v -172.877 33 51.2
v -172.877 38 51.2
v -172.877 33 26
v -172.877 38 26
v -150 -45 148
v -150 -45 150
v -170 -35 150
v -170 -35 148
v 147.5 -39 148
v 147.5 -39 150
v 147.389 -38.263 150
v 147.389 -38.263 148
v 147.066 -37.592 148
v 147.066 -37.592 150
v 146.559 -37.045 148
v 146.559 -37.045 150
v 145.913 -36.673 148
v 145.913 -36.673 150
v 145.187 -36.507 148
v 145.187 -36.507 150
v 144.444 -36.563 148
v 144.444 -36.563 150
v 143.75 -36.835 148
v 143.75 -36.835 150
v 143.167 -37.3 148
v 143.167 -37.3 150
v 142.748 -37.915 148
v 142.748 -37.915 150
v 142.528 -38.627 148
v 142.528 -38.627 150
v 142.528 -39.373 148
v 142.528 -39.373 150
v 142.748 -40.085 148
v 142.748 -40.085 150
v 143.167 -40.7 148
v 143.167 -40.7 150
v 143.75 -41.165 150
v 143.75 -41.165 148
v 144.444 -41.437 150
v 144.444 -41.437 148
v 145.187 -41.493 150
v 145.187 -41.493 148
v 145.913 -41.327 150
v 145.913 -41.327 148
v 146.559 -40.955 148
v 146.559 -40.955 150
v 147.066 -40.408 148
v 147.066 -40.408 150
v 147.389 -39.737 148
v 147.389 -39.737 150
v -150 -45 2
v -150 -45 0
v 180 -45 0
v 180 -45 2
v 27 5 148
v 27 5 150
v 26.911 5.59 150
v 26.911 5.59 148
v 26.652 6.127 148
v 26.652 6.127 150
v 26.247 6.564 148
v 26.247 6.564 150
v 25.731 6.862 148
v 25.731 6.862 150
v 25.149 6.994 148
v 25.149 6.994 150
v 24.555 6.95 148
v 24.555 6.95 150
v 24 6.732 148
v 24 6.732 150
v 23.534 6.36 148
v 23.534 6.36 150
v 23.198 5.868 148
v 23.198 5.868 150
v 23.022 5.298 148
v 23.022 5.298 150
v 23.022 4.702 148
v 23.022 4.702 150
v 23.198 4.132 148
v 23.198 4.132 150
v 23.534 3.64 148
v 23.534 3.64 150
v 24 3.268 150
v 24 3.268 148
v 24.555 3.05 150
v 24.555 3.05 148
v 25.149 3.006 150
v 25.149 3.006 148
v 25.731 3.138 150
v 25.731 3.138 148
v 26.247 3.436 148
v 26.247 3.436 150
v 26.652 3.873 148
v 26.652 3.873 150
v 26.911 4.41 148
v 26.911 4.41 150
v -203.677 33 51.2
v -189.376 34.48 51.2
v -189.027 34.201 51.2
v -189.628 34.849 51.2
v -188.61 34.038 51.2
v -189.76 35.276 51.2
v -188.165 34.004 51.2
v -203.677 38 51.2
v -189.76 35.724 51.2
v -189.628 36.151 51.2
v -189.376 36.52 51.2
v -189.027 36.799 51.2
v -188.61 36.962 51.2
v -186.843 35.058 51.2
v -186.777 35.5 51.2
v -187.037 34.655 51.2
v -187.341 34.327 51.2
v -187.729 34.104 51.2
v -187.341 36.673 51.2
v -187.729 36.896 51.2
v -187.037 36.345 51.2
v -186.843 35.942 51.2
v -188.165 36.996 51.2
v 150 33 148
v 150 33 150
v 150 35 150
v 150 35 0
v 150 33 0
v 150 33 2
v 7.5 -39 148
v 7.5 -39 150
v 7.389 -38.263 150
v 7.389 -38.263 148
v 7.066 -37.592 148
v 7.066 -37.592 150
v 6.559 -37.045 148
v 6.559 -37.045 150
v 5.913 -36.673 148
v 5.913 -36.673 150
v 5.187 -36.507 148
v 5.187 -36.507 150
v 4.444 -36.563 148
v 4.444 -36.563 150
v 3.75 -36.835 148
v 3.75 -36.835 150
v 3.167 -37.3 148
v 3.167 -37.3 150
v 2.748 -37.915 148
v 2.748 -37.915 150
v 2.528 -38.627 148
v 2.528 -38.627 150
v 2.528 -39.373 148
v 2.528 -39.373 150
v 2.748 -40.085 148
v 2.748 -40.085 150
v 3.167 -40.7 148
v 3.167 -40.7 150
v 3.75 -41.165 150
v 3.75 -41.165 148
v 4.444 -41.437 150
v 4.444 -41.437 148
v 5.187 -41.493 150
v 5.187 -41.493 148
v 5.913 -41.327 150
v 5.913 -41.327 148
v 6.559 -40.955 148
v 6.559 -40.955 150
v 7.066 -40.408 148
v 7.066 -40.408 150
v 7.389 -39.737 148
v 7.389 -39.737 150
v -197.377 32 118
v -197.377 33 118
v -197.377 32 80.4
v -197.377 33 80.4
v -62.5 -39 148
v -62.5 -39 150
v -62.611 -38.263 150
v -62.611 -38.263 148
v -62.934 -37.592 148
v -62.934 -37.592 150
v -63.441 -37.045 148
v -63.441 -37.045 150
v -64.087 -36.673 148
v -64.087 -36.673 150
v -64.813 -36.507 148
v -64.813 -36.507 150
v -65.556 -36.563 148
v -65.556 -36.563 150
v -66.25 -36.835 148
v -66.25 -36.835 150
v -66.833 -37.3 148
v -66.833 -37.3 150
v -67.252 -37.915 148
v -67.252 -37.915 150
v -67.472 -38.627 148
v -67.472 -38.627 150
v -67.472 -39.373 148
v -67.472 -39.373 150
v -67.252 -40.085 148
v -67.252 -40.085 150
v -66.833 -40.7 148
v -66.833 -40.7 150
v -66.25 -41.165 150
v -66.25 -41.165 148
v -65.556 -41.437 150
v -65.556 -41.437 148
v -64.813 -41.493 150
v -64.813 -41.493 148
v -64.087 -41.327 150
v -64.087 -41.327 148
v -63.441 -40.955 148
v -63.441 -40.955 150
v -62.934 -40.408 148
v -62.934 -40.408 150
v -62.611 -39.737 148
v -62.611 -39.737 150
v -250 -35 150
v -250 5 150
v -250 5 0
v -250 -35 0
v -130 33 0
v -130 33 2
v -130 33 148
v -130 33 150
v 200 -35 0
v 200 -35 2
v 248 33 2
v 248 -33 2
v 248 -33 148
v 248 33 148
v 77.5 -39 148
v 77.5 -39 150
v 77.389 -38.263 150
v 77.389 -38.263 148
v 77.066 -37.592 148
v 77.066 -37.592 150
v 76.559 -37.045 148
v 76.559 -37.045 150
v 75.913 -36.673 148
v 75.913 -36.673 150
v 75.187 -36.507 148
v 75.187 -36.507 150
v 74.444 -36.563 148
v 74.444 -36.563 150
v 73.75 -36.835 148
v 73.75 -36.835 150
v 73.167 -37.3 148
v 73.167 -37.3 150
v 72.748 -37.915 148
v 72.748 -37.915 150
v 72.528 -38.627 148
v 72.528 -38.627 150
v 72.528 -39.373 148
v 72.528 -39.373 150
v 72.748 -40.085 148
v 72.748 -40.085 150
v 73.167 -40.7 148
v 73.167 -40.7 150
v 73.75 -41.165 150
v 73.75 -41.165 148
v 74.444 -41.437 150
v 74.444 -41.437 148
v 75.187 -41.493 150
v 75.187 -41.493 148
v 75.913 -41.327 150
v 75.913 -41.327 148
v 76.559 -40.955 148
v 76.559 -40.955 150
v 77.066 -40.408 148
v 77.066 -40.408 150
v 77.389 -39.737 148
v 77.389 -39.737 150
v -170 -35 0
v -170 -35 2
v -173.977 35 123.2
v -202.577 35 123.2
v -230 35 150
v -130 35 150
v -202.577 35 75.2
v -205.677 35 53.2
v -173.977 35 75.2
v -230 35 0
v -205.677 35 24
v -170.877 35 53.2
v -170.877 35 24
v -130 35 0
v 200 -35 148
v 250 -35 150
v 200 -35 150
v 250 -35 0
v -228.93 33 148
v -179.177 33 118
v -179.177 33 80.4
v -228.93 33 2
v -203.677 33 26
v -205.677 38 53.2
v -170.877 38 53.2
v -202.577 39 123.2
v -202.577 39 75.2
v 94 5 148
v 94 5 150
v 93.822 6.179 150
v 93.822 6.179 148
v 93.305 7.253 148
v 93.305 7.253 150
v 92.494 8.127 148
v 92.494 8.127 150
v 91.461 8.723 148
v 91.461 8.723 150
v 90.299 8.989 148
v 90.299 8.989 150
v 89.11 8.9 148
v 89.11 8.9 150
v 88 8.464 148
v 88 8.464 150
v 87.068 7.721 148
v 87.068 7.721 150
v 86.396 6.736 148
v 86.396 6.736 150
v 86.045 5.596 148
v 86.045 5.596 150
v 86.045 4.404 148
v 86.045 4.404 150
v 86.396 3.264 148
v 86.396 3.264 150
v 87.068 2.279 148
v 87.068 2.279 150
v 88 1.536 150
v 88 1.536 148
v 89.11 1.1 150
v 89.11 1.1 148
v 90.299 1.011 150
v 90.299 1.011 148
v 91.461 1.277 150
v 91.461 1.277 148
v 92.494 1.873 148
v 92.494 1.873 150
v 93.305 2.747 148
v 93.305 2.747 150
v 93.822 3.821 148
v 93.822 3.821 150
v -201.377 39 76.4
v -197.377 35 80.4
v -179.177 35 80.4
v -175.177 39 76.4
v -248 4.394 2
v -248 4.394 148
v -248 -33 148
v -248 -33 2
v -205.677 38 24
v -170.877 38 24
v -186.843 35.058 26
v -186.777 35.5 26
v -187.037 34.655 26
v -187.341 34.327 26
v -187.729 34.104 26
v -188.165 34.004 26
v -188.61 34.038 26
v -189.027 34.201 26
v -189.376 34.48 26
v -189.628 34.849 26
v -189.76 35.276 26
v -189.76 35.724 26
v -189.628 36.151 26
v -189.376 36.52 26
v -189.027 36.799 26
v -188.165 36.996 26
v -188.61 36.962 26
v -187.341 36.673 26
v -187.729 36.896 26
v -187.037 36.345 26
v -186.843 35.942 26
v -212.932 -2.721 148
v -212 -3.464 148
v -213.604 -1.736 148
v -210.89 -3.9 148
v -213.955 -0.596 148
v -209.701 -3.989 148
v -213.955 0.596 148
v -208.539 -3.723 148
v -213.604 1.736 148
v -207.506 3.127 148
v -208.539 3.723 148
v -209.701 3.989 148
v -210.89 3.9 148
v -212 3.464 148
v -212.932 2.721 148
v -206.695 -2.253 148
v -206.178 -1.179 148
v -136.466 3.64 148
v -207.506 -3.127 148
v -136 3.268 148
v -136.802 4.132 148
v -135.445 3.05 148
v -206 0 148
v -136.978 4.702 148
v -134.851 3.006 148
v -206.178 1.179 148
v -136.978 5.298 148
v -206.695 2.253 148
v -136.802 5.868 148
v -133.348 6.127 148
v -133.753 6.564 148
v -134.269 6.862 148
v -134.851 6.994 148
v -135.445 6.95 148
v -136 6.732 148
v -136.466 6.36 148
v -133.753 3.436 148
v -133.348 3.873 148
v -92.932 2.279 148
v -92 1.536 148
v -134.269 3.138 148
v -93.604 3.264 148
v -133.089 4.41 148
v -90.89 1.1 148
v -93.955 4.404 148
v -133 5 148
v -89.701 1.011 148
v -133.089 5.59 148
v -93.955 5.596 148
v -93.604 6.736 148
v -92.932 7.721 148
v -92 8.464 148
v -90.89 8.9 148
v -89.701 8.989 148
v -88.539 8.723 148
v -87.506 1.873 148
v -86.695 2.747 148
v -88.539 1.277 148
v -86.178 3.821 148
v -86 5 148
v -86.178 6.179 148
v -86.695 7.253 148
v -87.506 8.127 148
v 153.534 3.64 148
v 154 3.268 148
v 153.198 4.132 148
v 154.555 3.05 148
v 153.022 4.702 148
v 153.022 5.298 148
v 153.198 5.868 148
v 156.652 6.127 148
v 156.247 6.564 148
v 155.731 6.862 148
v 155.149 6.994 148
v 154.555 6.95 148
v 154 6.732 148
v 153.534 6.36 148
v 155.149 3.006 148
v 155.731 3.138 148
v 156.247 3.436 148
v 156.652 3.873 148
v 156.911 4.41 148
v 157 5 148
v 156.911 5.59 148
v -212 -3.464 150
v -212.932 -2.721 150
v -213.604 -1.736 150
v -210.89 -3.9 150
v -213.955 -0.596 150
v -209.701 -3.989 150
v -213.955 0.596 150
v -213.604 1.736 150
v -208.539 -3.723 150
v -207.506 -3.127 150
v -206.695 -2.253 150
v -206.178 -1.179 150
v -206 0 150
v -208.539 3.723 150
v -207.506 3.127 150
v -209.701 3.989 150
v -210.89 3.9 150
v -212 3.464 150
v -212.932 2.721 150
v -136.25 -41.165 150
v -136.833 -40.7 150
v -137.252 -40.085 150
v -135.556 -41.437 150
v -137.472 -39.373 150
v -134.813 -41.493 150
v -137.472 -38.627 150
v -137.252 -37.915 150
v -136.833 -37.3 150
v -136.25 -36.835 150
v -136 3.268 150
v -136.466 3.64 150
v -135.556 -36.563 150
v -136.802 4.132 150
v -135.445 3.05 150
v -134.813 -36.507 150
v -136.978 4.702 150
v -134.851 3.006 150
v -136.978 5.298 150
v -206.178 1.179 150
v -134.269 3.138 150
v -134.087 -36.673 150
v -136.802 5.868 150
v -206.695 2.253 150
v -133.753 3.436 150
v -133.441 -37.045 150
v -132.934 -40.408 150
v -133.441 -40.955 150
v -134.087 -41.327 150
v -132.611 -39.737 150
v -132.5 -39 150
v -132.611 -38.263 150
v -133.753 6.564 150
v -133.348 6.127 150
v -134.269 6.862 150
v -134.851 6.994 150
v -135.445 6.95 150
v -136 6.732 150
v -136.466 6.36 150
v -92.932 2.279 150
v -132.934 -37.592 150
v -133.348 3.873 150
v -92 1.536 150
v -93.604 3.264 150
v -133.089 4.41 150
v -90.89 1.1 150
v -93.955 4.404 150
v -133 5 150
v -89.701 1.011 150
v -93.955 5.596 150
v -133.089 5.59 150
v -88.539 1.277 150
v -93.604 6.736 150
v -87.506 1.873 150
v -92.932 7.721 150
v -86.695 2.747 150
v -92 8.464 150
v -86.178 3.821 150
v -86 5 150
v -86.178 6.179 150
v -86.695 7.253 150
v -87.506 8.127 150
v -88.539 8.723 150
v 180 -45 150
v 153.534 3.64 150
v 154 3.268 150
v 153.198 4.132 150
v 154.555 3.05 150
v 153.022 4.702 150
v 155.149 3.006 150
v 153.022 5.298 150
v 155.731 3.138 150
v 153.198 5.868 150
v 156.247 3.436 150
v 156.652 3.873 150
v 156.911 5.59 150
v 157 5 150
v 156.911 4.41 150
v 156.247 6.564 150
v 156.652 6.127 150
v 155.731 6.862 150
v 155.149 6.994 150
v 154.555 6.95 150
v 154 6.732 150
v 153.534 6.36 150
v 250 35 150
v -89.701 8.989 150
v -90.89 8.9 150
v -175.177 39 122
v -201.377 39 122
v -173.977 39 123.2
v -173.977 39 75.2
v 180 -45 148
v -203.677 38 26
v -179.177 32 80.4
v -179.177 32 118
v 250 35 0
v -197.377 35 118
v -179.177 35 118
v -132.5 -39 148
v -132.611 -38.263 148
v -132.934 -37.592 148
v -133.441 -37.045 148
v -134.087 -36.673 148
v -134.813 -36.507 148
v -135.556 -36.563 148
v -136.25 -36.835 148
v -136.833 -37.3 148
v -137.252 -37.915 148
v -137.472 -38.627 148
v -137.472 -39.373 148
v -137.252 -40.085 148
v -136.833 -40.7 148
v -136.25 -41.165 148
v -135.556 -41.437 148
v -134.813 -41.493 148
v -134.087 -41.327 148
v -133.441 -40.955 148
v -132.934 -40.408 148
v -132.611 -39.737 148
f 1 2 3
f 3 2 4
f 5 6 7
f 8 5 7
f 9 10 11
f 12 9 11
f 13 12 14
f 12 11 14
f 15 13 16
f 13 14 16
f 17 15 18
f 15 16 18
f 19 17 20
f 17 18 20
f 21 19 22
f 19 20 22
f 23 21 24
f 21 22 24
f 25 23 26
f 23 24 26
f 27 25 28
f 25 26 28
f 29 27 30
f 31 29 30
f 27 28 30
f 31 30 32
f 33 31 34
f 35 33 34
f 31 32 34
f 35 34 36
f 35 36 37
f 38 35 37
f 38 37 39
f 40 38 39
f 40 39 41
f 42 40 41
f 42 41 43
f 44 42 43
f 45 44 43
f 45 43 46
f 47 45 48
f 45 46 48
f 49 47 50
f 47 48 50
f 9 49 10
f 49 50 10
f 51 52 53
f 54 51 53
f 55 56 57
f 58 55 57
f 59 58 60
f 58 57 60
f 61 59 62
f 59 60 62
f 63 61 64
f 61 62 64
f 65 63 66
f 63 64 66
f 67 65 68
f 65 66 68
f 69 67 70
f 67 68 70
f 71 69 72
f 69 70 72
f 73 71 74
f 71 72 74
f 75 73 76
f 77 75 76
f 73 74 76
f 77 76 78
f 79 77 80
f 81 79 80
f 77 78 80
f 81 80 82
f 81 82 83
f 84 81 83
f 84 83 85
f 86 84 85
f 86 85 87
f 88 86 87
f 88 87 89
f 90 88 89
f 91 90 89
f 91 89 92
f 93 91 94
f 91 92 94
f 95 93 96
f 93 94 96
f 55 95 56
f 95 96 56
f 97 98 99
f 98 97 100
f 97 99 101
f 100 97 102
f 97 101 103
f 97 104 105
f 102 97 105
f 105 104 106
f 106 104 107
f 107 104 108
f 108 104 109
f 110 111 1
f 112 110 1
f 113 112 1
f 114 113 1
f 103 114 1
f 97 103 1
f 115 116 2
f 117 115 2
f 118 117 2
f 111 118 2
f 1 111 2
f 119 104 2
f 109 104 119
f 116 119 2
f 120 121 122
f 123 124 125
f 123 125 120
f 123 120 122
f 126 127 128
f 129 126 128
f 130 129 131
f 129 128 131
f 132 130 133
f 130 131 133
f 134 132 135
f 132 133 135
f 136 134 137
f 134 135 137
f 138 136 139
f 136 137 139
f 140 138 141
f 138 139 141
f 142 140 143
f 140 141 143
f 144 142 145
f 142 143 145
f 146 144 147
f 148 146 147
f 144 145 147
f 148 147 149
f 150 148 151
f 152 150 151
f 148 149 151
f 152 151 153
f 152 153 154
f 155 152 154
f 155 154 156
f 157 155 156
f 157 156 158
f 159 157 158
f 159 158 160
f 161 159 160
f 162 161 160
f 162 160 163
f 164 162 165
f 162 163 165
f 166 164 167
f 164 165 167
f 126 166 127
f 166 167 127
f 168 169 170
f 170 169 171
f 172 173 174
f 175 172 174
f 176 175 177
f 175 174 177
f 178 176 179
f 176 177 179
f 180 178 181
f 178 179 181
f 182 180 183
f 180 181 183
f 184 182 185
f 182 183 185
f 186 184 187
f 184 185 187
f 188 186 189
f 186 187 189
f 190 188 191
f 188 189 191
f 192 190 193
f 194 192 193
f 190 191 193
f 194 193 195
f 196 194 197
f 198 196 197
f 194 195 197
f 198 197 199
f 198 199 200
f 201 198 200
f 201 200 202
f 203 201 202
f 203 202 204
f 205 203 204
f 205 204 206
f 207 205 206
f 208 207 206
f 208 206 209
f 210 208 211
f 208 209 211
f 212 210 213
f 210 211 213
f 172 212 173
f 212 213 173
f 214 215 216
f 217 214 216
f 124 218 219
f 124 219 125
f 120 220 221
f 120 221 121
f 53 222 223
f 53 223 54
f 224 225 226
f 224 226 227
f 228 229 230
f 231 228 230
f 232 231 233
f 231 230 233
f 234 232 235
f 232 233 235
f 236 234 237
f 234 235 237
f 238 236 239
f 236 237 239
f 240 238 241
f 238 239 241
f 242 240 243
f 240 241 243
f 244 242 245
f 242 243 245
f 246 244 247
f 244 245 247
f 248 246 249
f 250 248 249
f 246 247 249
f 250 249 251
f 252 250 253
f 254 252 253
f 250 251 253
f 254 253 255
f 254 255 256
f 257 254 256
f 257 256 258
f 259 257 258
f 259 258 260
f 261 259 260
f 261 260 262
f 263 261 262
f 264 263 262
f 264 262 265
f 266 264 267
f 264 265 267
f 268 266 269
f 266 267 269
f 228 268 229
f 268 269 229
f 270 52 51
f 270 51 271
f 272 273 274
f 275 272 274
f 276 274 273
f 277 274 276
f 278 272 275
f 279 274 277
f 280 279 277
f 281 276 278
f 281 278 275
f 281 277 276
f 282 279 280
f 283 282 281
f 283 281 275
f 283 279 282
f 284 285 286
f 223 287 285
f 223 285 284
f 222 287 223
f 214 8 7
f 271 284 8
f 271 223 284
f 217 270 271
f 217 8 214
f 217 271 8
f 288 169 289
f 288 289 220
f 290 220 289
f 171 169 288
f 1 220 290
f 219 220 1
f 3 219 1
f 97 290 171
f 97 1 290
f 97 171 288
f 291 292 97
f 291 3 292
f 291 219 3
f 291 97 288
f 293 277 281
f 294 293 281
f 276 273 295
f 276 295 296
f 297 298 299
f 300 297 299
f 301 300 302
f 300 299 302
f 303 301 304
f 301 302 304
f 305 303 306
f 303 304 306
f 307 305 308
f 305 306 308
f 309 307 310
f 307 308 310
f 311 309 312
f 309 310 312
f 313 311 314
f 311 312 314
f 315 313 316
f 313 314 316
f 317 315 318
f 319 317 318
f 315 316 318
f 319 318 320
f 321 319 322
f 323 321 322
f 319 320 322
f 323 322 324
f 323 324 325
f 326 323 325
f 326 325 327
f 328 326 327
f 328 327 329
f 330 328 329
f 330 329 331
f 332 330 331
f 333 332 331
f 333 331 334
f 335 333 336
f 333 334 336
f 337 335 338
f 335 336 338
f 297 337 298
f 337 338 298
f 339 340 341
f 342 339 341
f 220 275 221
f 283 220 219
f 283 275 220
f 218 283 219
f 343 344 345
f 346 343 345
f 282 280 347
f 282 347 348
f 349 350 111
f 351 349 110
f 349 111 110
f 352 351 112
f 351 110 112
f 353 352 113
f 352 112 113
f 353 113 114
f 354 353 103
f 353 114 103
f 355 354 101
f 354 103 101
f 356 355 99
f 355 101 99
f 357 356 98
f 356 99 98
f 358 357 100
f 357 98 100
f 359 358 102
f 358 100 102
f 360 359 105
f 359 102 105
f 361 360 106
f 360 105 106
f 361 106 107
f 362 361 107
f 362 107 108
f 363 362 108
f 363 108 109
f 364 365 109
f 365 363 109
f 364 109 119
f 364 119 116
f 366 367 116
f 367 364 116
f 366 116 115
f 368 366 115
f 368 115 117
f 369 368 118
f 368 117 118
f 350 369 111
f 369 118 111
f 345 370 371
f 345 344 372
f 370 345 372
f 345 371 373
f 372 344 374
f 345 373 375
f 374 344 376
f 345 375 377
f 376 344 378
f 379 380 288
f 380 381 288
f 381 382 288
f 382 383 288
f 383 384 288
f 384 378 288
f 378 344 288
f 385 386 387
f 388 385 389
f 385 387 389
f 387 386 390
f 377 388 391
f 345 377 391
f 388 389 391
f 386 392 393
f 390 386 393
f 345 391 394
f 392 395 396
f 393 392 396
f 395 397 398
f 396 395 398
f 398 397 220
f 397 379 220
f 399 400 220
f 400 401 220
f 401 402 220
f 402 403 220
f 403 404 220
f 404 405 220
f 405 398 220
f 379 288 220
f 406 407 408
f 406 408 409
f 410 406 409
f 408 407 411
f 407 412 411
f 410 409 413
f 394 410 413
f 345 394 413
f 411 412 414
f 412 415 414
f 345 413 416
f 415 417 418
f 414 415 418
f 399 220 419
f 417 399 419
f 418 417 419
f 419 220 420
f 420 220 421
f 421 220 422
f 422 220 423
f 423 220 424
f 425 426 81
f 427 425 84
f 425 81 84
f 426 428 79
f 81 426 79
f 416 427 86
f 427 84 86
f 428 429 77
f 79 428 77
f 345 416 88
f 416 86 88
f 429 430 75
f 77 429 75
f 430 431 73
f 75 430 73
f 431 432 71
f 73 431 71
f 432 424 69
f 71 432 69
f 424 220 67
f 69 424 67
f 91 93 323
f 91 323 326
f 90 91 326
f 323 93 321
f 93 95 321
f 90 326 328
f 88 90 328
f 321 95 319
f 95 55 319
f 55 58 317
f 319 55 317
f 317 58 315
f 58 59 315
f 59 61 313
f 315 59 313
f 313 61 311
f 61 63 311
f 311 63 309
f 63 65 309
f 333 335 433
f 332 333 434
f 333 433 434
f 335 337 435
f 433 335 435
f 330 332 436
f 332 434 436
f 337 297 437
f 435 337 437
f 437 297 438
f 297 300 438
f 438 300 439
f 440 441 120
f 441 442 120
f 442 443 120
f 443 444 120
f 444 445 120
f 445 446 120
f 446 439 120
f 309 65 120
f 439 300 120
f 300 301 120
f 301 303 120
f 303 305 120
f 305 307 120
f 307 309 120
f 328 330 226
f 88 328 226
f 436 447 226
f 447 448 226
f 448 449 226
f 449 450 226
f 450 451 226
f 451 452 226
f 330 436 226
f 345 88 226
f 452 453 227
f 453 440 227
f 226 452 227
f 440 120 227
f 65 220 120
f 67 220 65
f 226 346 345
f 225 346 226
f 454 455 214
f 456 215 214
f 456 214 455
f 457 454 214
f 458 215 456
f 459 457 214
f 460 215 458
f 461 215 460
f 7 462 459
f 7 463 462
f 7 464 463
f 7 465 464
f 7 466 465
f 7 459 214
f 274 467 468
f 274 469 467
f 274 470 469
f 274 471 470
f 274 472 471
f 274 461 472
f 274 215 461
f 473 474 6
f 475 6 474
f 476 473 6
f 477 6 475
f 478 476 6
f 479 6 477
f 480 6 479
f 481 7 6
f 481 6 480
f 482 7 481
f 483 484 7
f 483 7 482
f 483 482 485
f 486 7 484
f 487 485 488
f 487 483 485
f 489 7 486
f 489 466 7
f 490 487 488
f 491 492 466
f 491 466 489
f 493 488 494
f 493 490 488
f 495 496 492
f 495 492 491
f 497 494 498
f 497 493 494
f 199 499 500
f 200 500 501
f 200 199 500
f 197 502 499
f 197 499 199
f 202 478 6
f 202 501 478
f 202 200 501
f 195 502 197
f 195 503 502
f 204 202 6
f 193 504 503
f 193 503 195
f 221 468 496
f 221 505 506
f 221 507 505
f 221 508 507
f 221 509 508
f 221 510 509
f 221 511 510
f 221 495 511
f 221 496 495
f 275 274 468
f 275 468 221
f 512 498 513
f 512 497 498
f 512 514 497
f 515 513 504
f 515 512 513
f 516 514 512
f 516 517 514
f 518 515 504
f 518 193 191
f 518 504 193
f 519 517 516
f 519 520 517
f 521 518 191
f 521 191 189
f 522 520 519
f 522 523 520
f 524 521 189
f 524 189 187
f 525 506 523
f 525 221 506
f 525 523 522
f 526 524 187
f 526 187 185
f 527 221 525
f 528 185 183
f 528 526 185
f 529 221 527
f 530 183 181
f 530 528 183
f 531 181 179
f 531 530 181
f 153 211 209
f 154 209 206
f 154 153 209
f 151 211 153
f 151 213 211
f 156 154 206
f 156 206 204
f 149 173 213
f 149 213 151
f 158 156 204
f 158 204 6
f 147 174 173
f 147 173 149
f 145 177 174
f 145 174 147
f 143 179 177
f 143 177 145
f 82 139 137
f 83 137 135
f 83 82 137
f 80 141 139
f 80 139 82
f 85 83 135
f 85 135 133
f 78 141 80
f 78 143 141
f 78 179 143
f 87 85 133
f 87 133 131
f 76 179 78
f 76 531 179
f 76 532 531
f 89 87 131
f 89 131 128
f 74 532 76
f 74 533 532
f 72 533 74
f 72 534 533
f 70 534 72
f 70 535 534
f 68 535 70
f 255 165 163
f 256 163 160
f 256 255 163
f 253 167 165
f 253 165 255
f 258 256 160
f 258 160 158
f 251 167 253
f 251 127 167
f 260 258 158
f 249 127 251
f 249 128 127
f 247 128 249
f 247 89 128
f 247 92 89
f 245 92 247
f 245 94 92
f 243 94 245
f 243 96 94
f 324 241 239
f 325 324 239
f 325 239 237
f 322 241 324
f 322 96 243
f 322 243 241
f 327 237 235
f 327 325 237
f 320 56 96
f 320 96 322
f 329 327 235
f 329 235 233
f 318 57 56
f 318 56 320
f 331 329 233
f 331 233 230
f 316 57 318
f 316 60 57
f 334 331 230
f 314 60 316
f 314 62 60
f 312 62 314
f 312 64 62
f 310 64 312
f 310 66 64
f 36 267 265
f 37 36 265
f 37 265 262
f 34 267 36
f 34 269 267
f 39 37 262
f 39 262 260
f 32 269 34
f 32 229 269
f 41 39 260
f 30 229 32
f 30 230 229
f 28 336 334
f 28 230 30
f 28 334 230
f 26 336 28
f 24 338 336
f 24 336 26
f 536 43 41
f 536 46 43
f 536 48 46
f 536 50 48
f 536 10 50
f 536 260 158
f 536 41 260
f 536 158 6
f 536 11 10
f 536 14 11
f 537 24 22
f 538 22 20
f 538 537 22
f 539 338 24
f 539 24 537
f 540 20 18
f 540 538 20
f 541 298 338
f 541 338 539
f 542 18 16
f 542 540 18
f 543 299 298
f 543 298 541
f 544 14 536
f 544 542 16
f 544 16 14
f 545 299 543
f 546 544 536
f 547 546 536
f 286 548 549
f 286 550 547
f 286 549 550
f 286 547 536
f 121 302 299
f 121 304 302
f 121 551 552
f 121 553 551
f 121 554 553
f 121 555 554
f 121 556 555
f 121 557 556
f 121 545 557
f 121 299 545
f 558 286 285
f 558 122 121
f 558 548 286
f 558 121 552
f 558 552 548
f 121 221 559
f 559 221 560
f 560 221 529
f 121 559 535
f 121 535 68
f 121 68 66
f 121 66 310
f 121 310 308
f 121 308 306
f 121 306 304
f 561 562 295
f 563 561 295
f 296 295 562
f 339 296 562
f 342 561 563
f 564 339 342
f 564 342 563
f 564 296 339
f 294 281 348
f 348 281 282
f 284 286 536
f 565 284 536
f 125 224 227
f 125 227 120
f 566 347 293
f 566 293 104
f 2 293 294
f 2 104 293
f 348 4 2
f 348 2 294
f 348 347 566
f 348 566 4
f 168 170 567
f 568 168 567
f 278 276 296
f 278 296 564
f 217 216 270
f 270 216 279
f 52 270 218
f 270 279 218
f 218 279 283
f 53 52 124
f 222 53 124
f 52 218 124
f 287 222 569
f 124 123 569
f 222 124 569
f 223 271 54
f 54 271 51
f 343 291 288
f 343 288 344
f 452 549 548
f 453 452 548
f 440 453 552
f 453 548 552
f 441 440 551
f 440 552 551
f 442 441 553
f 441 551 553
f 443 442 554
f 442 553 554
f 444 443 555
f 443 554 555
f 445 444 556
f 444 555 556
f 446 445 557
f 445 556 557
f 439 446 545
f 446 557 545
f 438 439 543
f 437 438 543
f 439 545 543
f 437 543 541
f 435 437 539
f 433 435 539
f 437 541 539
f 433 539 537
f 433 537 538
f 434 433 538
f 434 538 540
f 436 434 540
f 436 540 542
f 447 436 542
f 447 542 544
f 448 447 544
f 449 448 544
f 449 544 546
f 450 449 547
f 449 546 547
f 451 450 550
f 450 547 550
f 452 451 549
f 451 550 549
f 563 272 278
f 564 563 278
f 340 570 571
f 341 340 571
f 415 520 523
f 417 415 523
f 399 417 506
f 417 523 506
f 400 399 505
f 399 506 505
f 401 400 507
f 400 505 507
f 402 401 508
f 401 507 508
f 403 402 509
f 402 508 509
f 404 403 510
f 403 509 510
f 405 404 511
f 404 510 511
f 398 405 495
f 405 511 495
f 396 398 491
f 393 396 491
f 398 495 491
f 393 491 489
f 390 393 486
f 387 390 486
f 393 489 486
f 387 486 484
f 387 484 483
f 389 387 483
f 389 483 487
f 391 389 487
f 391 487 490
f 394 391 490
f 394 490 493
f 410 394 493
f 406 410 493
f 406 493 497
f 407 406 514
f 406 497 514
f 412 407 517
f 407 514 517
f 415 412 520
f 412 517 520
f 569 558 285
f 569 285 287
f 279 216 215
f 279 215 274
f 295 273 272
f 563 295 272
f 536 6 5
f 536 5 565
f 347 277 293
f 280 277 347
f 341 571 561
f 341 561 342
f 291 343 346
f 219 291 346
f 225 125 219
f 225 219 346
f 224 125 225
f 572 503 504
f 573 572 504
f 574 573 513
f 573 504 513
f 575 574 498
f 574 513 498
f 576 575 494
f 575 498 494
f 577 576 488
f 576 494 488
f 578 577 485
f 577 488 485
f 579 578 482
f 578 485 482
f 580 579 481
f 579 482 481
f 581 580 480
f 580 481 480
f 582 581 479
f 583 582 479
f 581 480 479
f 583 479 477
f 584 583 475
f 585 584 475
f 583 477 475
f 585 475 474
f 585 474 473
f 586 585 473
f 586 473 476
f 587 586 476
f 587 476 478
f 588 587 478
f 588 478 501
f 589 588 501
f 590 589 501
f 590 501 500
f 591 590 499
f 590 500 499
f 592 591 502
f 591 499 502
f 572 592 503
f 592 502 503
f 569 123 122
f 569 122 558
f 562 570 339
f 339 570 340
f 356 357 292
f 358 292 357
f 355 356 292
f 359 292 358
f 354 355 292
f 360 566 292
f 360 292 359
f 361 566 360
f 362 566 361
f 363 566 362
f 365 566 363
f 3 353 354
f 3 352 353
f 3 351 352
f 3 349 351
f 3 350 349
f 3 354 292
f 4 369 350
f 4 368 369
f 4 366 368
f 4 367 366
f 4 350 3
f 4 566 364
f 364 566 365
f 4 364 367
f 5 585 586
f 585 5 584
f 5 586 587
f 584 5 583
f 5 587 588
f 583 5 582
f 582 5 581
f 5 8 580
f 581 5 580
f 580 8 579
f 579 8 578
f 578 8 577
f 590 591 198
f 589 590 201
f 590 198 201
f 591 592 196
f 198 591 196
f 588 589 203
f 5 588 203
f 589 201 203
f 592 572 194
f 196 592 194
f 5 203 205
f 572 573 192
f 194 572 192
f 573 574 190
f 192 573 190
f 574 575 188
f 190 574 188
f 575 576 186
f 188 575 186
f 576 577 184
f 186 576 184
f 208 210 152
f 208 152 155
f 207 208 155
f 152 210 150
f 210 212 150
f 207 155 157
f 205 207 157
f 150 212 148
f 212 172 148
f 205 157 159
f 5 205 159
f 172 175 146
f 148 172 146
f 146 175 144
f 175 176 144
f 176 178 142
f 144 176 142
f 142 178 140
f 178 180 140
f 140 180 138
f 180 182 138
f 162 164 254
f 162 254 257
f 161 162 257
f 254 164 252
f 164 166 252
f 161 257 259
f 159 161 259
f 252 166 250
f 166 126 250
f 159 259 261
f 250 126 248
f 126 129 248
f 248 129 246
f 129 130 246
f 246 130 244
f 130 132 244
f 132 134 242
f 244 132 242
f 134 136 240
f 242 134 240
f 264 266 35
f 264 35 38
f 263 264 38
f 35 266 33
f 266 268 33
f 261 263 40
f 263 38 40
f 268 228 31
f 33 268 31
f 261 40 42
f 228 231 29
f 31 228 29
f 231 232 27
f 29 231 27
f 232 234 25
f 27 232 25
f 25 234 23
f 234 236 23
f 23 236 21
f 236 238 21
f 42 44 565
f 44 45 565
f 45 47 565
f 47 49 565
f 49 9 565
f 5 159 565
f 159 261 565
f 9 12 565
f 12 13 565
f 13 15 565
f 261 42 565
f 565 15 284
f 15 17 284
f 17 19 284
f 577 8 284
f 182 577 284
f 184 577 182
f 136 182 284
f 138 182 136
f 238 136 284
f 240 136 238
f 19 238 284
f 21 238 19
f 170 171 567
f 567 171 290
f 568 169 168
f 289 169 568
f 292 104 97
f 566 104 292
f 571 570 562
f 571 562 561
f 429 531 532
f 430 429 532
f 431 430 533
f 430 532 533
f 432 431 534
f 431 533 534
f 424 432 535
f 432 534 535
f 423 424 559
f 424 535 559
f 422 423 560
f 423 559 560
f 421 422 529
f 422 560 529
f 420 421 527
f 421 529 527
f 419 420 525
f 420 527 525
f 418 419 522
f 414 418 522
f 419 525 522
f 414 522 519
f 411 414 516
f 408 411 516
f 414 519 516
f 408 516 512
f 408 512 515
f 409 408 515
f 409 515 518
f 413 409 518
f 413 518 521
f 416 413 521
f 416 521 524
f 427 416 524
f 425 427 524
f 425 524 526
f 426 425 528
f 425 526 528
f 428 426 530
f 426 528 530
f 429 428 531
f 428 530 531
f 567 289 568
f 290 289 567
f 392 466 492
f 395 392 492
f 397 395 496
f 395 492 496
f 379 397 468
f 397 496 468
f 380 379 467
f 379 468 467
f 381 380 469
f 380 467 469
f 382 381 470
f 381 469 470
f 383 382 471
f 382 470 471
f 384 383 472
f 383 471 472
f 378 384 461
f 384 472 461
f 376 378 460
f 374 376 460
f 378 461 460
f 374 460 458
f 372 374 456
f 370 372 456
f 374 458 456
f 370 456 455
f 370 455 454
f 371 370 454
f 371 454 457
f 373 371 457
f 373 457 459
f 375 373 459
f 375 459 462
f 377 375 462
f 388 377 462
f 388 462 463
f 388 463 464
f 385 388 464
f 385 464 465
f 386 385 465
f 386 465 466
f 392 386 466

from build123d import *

# Parameters (mm, degrees)
EXTRUDE_1_DEPTH        = 150
SHELL_START            = 2
SHELL_1_DEPTH          = 146
SKETCH_3_W             = 500
SKETCH_3_H             = 2
EXTRUDE_2_DEPTH        = 10
CUT_EXTRUDE_1_DEPTH    = 10
SKETCH_5_R             = 2.5
CUT_EXTRUDE_2_DEPTH    = 2
PATTERN_LINEAR_1_COUNT = 5
PATTERN_LINEAR_1_PITCH = 70
SKETCH_6_R             = 2
CUT_EXTRUDE_3_DEPTH    = 2
SKETCH_7_R             = 4
CUT_EXTRUDE_4_DEPTH    = 2
CUT_EXTRUDE_5_REACH    = 297
SKETCH_8_R             = 4
SKETCH_9_W             = 28.6
SKETCH_9_H             = 48
SKETCH_9_W_2           = 18.2
SKETCH_9_H_2           = 37.6
EXTRUDE_3_DEPTH        = 4
CHAMFER_1_SIZE         = 4
SKETCH_11_W            = 34.8
SKETCH_11_H            = 29.2
SKETCH_11_W_2          = 30.8
SKETCH_11_H_2          = 25.2
EXTRUDE_4_DEPTH        = 3
CUT_EXTRUDE_6_REACH    = 304.324
SKETCH_11_2_W          = 30.8
SKETCH_11_2_H          = 25.2
EXTRUDE_5_REACH        = 274.555
SKETCH_14_R            = 1.5
SKETCH_9_2_W           = 18.2
SKETCH_9_2_H           = 37.6
EXTRUDE_6_DEPTH        = 3


# Read off the part's stored shape, not the designer's step: 抽壳1
with BuildPart() as part:
    # 草图1 → 凸台-拉伸1 (new body)
    with BuildSketch(Plane.XY):
        Polygon((-250, 5), (-230, 35), (-130, 35), (-130, 33), (150, 33), (150, 35), (250, 35), (250, -35), (-250, -35), align=None)
    extrude(amount=EXTRUDE_1_DEPTH)

    # 抽壳1 outline → 抽壳1 (cut)
    with BuildSketch(Plane.XY.offset(SHELL_START)):
        Polygon((248, 33), (-228.929632483, 33), (-248, 4.394448725), (-248, -33), (248, -33), align=None)
    extrude(amount=SHELL_1_DEPTH, mode=Mode.SUBTRACT)

    # 草图3 → 凸台-拉伸2 (add)
    with BuildSketch(Plane.XZ.offset(35)):
        with Locations((0, 149)):
            Rectangle(SKETCH_3_W, SKETCH_3_H)
    extrude_2 = extrude(amount=EXTRUDE_2_DEPTH)

    # 草图4 → 切除-拉伸1 (cut)
    with BuildSketch(Plane.XY.offset(150)):
        Polygon((-150, -45), (-170, -35), (-250, -35), (-250, -45), align=None)
        Polygon((250, -35), (200, -35), (180, -45), (250, -45), align=None)
    cut_extrude_1 = extrude(amount=-CUT_EXTRUDE_1_DEPTH, mode=Mode.SUBTRACT)

    # 镜向1: 凸台-拉伸2, 切除-拉伸1 across plane
    add(extrude_2.mirror(Plane(origin=(0, 0, 75), x_dir=(1, 0, 0), z_dir=(0, 0, -1))))
    add(cut_extrude_1.mirror(Plane(origin=(0, 0, 75), x_dir=(1, 0, 0), z_dir=(0, 0, -1))), mode=Mode.SUBTRACT)

    # 草图5 → 切除-拉伸2 (cut)
    with BuildSketch(Plane.XY.offset(150)):
        with Locations((-135, -39)):
            Circle(SKETCH_5_R)
    cut_extrude_2 = extrude(amount=-CUT_EXTRUDE_2_DEPTH, mode=Mode.SUBTRACT)

    # 阵列(线性)1: 切除-拉伸2 ×5
    with Locations(*[(i * PATTERN_LINEAR_1_PITCH, 0, 0) for i in range(1, PATTERN_LINEAR_1_COUNT)]):
        add(cut_extrude_2, mode=Mode.SUBTRACT)

    # 草图6 → 切除-拉伸3 (cut)
    with BuildSketch(Plane.XY.offset(150)):
        with Locations((-135, 5)):
            Circle(SKETCH_6_R)
        with Locations((25, 5)):
            Circle(SKETCH_6_R)
        with Locations((155, 5)):
            Circle(SKETCH_6_R)
    extrude(amount=-CUT_EXTRUDE_3_DEPTH, mode=Mode.SUBTRACT)

    # 草图7 → 切除-拉伸4 (cut)
    with BuildSketch(Plane.XY.offset(150)):
        with Locations((-90, 5)):
            Circle(SKETCH_7_R)
        with Locations((90, 5)):
            Circle(SKETCH_7_R)
    extrude(amount=-CUT_EXTRUDE_4_DEPTH, mode=Mode.SUBTRACT)

    # 草图8 → 切除-拉伸5 (cut, up to next)
    with BuildSketch(Plane.XY.offset(150), mode=Mode.PRIVATE) as cut_extrude_5_sk1:
        with Locations((-210, 0)):
            Circle(SKETCH_8_R)
    cut_extrude_5_tool1 = extrude(cut_extrude_5_sk1.sketch, amount=-CUT_EXTRUDE_5_REACH, mode=Mode.PRIVATE) & part.part
    add(cut_extrude_5_tool1.solids().sort_by_distance((-210, 0, 150))[0], mode=Mode.SUBTRACT)

    # 草图9 → 凸台-拉伸3 (add)
    with BuildSketch(Plane(origin=(0, 35, 0), x_dir=(1, 0, 0), z_dir=(0, 1, 0))):
        with Locations((-188.276603419, -99.2)):
            Rectangle(SKETCH_9_W, SKETCH_9_H)
        with Locations((-188.276603419, -99.2)):
            Rectangle(SKETCH_9_W_2, SKETCH_9_H_2, mode=Mode.SUBTRACT)
    extrude(amount=EXTRUDE_3_DEPTH)

    # 倒角1
    chamfer_1_edges = [part.edges().sort_by_distance(p)[0] for p in [
        (-188.276603419, 39, 80.4),
        (-179.176603419, 39, 99.2),
        (-188.276603419, 39, 118),
        (-197.376603419, 39, 99.2),
    ]]
    chamfer(chamfer_1_edges, length=CHAMFER_1_SIZE - 0.0001)  # a hair under: the kernel refuses the full size

    # 草图11 → 凸台-拉伸4 (add)
    with BuildSketch(Plane(origin=(0, 35, 0), x_dir=(1, 0, 0), z_dir=(0, 1, 0))):
        with Locations((-188.276603419, -38.6)):
            Rectangle(SKETCH_11_W, SKETCH_11_H)
        with Locations((-188.276603419, -38.6)):
            Rectangle(SKETCH_11_W_2, SKETCH_11_H_2, mode=Mode.SUBTRACT)
    extrude(amount=EXTRUDE_4_DEPTH)

    # 草图11<2> → 切除-拉伸6 (cut, up to next)
    with BuildSketch(Plane(origin=(0, 35, 0), x_dir=(1, 0, 0), z_dir=(0, 1, 0)), mode=Mode.PRIVATE) as cut_extrude_6_sk1:
        with Locations((-188.276603419, -38.6)):
            Rectangle(SKETCH_11_2_W, SKETCH_11_2_H)
    cut_extrude_6_tool1 = extrude(cut_extrude_6_sk1.sketch, amount=-CUT_EXTRUDE_6_REACH, mode=Mode.PRIVATE) & part.part
    add(cut_extrude_6_tool1.solids().sort_by_distance((-188.276603, 35, 38.6))[0], mode=Mode.SUBTRACT)

    # 草图14 → 凸台-拉伸5 (add, up to next)
    with BuildSketch(Plane(origin=(0, 0, 51.2), x_dir=(-1, 0, 0), z_dir=(0, 0, -1)), mode=Mode.PRIVATE) as extrude_5_sk1:
        with Locations(Location((188.276603419, 35.5, 0), (0, 0, 180))):
            Circle(SKETCH_14_R)
    extrude_5_tool1 = extrude(extrude_5_sk1.sketch, amount=EXTRUDE_5_REACH, mode=Mode.PRIVATE) - part.part
    add(extrude_5_tool1.solids().sort_by_distance((-188.276603, 35.5, 51.2))[0])

    # 草图9<2> → 凸台-拉伸6 (add)
    with BuildSketch(Plane(origin=(0, 35, 0), x_dir=(1, 0, 0), z_dir=(0, 1, 0))):
        with Locations((-188.276603419, -99.2)):
            Rectangle(SKETCH_9_2_W, SKETCH_9_2_H)
    extrude(amount=-EXTRUDE_6_DEPTH)


solid = part.part
